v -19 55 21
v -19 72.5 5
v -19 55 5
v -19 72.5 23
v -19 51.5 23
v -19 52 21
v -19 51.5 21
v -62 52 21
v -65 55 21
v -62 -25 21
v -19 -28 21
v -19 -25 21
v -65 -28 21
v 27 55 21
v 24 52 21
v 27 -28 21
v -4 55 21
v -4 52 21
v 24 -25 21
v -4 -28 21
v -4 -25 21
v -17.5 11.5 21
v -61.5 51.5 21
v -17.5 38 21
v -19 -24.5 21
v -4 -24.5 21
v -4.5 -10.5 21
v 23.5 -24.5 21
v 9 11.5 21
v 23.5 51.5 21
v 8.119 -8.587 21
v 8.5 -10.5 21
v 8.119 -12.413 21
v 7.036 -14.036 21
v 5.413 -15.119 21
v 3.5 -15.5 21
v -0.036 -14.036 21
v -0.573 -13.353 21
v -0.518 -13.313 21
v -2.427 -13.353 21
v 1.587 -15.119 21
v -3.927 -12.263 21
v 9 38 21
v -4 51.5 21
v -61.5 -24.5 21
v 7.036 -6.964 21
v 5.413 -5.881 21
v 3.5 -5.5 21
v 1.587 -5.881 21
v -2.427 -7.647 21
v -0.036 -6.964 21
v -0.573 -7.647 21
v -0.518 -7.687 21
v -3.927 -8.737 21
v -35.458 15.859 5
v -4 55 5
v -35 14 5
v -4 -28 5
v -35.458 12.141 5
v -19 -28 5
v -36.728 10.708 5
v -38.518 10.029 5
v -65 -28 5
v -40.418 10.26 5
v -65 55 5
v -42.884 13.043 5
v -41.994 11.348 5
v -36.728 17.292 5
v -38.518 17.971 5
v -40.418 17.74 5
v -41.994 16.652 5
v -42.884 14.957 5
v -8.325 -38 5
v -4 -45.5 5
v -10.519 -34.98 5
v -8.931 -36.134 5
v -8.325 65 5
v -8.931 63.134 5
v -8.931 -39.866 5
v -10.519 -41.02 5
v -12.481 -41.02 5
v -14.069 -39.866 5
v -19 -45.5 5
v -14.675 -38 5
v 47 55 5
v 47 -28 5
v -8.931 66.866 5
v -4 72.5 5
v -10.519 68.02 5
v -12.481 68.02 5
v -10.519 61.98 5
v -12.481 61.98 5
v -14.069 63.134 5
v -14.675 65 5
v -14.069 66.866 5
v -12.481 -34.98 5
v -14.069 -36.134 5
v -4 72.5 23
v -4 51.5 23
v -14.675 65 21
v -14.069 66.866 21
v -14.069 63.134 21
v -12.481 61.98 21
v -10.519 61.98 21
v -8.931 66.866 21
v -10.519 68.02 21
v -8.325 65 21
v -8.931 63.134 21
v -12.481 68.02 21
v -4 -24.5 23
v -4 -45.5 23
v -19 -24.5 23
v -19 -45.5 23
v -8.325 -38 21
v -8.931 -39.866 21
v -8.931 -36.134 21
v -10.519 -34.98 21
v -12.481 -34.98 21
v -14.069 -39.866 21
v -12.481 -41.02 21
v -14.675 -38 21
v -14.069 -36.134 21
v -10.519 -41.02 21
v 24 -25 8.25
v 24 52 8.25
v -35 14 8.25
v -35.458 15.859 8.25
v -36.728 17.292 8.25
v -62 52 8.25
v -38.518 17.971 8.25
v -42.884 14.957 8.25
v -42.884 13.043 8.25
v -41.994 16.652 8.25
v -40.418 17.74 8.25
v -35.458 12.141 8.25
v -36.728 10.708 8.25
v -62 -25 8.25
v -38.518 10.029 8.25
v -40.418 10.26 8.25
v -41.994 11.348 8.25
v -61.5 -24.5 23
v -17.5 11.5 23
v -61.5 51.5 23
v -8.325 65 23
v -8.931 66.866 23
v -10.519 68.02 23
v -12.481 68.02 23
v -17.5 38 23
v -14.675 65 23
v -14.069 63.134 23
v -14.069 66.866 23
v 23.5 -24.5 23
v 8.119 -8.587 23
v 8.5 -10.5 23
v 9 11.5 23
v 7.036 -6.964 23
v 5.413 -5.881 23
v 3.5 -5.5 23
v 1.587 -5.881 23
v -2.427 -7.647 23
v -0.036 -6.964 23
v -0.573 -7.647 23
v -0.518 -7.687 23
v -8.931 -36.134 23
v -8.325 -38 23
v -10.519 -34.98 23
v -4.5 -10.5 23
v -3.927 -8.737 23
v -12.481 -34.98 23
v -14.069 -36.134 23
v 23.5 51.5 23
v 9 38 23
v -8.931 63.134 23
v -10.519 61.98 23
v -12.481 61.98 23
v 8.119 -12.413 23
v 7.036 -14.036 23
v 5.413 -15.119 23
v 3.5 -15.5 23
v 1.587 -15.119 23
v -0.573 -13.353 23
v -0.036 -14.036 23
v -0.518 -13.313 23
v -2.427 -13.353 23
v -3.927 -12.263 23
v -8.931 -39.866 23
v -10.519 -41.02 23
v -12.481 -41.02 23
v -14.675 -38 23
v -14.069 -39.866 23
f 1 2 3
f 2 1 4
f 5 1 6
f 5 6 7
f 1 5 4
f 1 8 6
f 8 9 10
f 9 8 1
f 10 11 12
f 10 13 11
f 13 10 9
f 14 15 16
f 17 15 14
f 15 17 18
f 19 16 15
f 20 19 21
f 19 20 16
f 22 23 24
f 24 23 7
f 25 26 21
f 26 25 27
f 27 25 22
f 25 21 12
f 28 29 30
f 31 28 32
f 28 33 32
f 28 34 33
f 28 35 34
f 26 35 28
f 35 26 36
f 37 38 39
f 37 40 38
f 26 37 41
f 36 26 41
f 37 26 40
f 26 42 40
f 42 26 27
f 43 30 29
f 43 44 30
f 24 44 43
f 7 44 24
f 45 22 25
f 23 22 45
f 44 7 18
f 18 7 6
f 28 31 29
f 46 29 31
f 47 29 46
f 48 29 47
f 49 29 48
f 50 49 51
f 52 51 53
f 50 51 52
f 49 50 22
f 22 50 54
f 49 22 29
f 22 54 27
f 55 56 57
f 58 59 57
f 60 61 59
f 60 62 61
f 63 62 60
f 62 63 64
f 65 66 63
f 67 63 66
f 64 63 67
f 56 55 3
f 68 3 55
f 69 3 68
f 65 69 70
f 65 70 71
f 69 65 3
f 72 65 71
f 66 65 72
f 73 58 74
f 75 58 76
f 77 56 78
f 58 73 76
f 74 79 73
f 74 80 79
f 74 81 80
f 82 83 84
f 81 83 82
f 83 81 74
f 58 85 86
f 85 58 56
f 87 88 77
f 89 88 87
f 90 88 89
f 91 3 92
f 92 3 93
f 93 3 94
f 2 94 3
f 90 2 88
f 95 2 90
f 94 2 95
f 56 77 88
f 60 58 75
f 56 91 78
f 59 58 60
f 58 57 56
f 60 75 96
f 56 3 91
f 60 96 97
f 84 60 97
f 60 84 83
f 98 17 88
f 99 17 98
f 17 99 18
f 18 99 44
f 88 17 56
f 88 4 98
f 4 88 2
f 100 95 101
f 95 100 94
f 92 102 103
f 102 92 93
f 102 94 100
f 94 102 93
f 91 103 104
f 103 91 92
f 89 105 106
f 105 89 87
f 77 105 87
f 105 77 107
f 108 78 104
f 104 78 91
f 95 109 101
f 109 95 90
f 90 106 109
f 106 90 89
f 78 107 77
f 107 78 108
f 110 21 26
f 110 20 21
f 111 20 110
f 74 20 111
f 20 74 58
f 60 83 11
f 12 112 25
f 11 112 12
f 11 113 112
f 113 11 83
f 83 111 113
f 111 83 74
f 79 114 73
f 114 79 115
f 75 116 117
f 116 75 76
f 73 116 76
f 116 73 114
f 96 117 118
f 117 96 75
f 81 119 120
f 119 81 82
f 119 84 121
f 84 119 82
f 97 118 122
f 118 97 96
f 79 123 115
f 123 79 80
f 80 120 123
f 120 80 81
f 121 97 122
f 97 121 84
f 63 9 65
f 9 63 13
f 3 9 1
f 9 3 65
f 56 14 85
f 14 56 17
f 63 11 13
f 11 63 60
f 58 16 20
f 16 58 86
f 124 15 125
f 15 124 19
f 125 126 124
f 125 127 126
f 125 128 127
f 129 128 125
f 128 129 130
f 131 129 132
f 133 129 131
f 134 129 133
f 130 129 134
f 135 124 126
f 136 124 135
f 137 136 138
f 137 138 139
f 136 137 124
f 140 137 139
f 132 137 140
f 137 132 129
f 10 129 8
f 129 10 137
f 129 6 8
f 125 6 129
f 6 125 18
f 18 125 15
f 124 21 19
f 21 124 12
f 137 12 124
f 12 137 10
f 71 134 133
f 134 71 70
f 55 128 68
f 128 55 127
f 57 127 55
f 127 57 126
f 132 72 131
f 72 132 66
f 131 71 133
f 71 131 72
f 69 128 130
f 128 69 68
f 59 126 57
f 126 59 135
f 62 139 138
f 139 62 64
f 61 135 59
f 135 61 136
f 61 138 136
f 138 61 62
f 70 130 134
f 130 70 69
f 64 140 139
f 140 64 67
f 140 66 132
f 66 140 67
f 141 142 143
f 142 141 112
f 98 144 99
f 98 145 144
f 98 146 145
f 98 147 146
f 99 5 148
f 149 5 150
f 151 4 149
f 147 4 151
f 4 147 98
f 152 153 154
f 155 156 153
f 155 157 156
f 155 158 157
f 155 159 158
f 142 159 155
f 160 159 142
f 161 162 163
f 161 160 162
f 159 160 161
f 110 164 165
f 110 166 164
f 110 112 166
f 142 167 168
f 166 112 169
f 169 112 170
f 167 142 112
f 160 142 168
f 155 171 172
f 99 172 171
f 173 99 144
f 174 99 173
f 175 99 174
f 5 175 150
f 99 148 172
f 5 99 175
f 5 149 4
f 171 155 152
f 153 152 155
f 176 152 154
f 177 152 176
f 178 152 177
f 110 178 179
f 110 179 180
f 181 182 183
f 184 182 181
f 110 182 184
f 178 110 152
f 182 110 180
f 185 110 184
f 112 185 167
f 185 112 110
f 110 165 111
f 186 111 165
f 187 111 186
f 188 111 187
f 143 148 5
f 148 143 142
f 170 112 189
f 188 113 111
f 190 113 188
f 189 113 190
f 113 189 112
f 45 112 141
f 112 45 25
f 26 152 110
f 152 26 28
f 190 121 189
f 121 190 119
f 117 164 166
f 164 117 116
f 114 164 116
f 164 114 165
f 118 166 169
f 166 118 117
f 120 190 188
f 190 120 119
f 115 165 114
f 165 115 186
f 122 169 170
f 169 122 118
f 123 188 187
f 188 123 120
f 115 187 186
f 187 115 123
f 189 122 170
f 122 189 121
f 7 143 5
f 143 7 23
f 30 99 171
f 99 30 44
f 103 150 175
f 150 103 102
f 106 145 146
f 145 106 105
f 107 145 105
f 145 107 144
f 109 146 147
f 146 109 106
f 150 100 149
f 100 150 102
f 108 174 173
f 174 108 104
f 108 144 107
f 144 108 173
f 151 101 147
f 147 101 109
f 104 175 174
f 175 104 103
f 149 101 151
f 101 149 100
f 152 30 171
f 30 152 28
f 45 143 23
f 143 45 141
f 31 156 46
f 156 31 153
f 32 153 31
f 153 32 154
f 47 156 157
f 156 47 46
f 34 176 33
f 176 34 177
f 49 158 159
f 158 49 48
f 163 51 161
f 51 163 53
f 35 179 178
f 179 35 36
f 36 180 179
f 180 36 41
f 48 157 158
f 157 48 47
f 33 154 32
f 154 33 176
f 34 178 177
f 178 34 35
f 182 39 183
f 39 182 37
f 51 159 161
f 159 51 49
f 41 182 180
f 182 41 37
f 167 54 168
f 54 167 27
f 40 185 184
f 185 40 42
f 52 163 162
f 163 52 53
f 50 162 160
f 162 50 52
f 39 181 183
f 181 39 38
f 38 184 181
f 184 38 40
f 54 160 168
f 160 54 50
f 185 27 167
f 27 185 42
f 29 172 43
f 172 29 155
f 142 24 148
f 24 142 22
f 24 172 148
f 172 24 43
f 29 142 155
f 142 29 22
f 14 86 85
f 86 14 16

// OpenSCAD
module mount (){
	difference(){
		import("gnss_mount.stl", convexity=6);
		translate([-30,-30,0])cube([60,64,20]);
	}
}

module cover (){
	import("gnss_cover.stl", convexity=6);
}

module meatball (){
	import("meatball.stl", convexity=9);
}

module spacer (){
	import("gnss_spacer.stl", convexity=6);
}

module Pitot_bottom (){
	import("Pitot_bottom.stl", convexity=9);
}

module Pitot_cutout (){
	import("Pitot_cutout.stl", convexity=6);
}

module Pitot_top (){
	import("Pitot_top.stl", convexity=6);
}

module plate(){ //top plate
	difference(){ //foot1
		translate([42.5,-21,0])cube([15,21,2]);
		translate([50,-13.5,-1])cylinder(d=6.35,19.5);
	}
	difference(){ //foot2
		translate([42.5,76,0])cube([15,21,2]);
		translate([50,89.5,-1])cylinder(d=6.35,19.5);
	}
	difference(){ //holes into cover
		cube([85,76,2]);
		translate([65,14,-0.5])cylinder(h=3,r=5);
		translate([65-5,14,-0.5])cylinder(h=3,r=3);
		translate([44,36,-0.5])cube([26.5,26.5,3]);
		//translate([50,32,-0.5])cube([17,17,1]);
	}

}

module foot(){
	
	difference(){
		cube([15,20,16]);
		translate([7.5,7.5,-0.5])cylinder(d=6.35,19.5);
	}
}

h = 92;
w = 83;

module mount2(){
		
		depth = 16;
		difference(){
			cube([h,w,depth]);
			translate([3,3,3.25])cube([h-6,w-6,depth+5]);
			translate([26,42,-1])cylinder(h=9,r=4);
		}
}

translate([27,13.5,15])polyhedron(
  points=[ [0,w/2,6], //0
			[0,w/2,-10], //1
			[0,-w/2,-10], //2
			[0,-w/2,6], //3 the four points at base the apex point 
             [20,w/2,-10], //4 
			[20,-w/2,-10]],//5 
  	faces=[ [0,1,4],[5,4,1,2],[5,2,3],[0,4,5,3],[3,2,1,0]          // each triangle side
             ]           // two triangles for square base
 );

//,[2,3,5], [2,3,5,4], [1,2,4,5], [0,1,2,3],[0,1,4], [0,2,5,4]

translate([-4,72.5,5])rotate([0,0,180])foot();
translate([-19,-45.5,5])foot();
translate([-65,-28, 5])mount2();
translate([-61.5,-24.5,21])plate();

// //translate([-30,30,-20]) rotate([90,0,0]) scale([1.2,1.2,1.2]) mount();
// //rotate([-90,0,90]) translate([-40,-40,-40])cover();

//rotate([-90,180,0]) translate([-25,-65,-16])scale([1.2,1.2,1.2])spacer();

//rotate([0,0,-90]) translate([15,33,80]) scale([1.1,1.1,1.1])Pitot_bottom();
//rotate([0,0,-90]) translate([15,39,80]) Pitot_top();	

//rotate([0,0,-90]) translate([0,-23,35])scale([.3,.3,.2]) meatball();
